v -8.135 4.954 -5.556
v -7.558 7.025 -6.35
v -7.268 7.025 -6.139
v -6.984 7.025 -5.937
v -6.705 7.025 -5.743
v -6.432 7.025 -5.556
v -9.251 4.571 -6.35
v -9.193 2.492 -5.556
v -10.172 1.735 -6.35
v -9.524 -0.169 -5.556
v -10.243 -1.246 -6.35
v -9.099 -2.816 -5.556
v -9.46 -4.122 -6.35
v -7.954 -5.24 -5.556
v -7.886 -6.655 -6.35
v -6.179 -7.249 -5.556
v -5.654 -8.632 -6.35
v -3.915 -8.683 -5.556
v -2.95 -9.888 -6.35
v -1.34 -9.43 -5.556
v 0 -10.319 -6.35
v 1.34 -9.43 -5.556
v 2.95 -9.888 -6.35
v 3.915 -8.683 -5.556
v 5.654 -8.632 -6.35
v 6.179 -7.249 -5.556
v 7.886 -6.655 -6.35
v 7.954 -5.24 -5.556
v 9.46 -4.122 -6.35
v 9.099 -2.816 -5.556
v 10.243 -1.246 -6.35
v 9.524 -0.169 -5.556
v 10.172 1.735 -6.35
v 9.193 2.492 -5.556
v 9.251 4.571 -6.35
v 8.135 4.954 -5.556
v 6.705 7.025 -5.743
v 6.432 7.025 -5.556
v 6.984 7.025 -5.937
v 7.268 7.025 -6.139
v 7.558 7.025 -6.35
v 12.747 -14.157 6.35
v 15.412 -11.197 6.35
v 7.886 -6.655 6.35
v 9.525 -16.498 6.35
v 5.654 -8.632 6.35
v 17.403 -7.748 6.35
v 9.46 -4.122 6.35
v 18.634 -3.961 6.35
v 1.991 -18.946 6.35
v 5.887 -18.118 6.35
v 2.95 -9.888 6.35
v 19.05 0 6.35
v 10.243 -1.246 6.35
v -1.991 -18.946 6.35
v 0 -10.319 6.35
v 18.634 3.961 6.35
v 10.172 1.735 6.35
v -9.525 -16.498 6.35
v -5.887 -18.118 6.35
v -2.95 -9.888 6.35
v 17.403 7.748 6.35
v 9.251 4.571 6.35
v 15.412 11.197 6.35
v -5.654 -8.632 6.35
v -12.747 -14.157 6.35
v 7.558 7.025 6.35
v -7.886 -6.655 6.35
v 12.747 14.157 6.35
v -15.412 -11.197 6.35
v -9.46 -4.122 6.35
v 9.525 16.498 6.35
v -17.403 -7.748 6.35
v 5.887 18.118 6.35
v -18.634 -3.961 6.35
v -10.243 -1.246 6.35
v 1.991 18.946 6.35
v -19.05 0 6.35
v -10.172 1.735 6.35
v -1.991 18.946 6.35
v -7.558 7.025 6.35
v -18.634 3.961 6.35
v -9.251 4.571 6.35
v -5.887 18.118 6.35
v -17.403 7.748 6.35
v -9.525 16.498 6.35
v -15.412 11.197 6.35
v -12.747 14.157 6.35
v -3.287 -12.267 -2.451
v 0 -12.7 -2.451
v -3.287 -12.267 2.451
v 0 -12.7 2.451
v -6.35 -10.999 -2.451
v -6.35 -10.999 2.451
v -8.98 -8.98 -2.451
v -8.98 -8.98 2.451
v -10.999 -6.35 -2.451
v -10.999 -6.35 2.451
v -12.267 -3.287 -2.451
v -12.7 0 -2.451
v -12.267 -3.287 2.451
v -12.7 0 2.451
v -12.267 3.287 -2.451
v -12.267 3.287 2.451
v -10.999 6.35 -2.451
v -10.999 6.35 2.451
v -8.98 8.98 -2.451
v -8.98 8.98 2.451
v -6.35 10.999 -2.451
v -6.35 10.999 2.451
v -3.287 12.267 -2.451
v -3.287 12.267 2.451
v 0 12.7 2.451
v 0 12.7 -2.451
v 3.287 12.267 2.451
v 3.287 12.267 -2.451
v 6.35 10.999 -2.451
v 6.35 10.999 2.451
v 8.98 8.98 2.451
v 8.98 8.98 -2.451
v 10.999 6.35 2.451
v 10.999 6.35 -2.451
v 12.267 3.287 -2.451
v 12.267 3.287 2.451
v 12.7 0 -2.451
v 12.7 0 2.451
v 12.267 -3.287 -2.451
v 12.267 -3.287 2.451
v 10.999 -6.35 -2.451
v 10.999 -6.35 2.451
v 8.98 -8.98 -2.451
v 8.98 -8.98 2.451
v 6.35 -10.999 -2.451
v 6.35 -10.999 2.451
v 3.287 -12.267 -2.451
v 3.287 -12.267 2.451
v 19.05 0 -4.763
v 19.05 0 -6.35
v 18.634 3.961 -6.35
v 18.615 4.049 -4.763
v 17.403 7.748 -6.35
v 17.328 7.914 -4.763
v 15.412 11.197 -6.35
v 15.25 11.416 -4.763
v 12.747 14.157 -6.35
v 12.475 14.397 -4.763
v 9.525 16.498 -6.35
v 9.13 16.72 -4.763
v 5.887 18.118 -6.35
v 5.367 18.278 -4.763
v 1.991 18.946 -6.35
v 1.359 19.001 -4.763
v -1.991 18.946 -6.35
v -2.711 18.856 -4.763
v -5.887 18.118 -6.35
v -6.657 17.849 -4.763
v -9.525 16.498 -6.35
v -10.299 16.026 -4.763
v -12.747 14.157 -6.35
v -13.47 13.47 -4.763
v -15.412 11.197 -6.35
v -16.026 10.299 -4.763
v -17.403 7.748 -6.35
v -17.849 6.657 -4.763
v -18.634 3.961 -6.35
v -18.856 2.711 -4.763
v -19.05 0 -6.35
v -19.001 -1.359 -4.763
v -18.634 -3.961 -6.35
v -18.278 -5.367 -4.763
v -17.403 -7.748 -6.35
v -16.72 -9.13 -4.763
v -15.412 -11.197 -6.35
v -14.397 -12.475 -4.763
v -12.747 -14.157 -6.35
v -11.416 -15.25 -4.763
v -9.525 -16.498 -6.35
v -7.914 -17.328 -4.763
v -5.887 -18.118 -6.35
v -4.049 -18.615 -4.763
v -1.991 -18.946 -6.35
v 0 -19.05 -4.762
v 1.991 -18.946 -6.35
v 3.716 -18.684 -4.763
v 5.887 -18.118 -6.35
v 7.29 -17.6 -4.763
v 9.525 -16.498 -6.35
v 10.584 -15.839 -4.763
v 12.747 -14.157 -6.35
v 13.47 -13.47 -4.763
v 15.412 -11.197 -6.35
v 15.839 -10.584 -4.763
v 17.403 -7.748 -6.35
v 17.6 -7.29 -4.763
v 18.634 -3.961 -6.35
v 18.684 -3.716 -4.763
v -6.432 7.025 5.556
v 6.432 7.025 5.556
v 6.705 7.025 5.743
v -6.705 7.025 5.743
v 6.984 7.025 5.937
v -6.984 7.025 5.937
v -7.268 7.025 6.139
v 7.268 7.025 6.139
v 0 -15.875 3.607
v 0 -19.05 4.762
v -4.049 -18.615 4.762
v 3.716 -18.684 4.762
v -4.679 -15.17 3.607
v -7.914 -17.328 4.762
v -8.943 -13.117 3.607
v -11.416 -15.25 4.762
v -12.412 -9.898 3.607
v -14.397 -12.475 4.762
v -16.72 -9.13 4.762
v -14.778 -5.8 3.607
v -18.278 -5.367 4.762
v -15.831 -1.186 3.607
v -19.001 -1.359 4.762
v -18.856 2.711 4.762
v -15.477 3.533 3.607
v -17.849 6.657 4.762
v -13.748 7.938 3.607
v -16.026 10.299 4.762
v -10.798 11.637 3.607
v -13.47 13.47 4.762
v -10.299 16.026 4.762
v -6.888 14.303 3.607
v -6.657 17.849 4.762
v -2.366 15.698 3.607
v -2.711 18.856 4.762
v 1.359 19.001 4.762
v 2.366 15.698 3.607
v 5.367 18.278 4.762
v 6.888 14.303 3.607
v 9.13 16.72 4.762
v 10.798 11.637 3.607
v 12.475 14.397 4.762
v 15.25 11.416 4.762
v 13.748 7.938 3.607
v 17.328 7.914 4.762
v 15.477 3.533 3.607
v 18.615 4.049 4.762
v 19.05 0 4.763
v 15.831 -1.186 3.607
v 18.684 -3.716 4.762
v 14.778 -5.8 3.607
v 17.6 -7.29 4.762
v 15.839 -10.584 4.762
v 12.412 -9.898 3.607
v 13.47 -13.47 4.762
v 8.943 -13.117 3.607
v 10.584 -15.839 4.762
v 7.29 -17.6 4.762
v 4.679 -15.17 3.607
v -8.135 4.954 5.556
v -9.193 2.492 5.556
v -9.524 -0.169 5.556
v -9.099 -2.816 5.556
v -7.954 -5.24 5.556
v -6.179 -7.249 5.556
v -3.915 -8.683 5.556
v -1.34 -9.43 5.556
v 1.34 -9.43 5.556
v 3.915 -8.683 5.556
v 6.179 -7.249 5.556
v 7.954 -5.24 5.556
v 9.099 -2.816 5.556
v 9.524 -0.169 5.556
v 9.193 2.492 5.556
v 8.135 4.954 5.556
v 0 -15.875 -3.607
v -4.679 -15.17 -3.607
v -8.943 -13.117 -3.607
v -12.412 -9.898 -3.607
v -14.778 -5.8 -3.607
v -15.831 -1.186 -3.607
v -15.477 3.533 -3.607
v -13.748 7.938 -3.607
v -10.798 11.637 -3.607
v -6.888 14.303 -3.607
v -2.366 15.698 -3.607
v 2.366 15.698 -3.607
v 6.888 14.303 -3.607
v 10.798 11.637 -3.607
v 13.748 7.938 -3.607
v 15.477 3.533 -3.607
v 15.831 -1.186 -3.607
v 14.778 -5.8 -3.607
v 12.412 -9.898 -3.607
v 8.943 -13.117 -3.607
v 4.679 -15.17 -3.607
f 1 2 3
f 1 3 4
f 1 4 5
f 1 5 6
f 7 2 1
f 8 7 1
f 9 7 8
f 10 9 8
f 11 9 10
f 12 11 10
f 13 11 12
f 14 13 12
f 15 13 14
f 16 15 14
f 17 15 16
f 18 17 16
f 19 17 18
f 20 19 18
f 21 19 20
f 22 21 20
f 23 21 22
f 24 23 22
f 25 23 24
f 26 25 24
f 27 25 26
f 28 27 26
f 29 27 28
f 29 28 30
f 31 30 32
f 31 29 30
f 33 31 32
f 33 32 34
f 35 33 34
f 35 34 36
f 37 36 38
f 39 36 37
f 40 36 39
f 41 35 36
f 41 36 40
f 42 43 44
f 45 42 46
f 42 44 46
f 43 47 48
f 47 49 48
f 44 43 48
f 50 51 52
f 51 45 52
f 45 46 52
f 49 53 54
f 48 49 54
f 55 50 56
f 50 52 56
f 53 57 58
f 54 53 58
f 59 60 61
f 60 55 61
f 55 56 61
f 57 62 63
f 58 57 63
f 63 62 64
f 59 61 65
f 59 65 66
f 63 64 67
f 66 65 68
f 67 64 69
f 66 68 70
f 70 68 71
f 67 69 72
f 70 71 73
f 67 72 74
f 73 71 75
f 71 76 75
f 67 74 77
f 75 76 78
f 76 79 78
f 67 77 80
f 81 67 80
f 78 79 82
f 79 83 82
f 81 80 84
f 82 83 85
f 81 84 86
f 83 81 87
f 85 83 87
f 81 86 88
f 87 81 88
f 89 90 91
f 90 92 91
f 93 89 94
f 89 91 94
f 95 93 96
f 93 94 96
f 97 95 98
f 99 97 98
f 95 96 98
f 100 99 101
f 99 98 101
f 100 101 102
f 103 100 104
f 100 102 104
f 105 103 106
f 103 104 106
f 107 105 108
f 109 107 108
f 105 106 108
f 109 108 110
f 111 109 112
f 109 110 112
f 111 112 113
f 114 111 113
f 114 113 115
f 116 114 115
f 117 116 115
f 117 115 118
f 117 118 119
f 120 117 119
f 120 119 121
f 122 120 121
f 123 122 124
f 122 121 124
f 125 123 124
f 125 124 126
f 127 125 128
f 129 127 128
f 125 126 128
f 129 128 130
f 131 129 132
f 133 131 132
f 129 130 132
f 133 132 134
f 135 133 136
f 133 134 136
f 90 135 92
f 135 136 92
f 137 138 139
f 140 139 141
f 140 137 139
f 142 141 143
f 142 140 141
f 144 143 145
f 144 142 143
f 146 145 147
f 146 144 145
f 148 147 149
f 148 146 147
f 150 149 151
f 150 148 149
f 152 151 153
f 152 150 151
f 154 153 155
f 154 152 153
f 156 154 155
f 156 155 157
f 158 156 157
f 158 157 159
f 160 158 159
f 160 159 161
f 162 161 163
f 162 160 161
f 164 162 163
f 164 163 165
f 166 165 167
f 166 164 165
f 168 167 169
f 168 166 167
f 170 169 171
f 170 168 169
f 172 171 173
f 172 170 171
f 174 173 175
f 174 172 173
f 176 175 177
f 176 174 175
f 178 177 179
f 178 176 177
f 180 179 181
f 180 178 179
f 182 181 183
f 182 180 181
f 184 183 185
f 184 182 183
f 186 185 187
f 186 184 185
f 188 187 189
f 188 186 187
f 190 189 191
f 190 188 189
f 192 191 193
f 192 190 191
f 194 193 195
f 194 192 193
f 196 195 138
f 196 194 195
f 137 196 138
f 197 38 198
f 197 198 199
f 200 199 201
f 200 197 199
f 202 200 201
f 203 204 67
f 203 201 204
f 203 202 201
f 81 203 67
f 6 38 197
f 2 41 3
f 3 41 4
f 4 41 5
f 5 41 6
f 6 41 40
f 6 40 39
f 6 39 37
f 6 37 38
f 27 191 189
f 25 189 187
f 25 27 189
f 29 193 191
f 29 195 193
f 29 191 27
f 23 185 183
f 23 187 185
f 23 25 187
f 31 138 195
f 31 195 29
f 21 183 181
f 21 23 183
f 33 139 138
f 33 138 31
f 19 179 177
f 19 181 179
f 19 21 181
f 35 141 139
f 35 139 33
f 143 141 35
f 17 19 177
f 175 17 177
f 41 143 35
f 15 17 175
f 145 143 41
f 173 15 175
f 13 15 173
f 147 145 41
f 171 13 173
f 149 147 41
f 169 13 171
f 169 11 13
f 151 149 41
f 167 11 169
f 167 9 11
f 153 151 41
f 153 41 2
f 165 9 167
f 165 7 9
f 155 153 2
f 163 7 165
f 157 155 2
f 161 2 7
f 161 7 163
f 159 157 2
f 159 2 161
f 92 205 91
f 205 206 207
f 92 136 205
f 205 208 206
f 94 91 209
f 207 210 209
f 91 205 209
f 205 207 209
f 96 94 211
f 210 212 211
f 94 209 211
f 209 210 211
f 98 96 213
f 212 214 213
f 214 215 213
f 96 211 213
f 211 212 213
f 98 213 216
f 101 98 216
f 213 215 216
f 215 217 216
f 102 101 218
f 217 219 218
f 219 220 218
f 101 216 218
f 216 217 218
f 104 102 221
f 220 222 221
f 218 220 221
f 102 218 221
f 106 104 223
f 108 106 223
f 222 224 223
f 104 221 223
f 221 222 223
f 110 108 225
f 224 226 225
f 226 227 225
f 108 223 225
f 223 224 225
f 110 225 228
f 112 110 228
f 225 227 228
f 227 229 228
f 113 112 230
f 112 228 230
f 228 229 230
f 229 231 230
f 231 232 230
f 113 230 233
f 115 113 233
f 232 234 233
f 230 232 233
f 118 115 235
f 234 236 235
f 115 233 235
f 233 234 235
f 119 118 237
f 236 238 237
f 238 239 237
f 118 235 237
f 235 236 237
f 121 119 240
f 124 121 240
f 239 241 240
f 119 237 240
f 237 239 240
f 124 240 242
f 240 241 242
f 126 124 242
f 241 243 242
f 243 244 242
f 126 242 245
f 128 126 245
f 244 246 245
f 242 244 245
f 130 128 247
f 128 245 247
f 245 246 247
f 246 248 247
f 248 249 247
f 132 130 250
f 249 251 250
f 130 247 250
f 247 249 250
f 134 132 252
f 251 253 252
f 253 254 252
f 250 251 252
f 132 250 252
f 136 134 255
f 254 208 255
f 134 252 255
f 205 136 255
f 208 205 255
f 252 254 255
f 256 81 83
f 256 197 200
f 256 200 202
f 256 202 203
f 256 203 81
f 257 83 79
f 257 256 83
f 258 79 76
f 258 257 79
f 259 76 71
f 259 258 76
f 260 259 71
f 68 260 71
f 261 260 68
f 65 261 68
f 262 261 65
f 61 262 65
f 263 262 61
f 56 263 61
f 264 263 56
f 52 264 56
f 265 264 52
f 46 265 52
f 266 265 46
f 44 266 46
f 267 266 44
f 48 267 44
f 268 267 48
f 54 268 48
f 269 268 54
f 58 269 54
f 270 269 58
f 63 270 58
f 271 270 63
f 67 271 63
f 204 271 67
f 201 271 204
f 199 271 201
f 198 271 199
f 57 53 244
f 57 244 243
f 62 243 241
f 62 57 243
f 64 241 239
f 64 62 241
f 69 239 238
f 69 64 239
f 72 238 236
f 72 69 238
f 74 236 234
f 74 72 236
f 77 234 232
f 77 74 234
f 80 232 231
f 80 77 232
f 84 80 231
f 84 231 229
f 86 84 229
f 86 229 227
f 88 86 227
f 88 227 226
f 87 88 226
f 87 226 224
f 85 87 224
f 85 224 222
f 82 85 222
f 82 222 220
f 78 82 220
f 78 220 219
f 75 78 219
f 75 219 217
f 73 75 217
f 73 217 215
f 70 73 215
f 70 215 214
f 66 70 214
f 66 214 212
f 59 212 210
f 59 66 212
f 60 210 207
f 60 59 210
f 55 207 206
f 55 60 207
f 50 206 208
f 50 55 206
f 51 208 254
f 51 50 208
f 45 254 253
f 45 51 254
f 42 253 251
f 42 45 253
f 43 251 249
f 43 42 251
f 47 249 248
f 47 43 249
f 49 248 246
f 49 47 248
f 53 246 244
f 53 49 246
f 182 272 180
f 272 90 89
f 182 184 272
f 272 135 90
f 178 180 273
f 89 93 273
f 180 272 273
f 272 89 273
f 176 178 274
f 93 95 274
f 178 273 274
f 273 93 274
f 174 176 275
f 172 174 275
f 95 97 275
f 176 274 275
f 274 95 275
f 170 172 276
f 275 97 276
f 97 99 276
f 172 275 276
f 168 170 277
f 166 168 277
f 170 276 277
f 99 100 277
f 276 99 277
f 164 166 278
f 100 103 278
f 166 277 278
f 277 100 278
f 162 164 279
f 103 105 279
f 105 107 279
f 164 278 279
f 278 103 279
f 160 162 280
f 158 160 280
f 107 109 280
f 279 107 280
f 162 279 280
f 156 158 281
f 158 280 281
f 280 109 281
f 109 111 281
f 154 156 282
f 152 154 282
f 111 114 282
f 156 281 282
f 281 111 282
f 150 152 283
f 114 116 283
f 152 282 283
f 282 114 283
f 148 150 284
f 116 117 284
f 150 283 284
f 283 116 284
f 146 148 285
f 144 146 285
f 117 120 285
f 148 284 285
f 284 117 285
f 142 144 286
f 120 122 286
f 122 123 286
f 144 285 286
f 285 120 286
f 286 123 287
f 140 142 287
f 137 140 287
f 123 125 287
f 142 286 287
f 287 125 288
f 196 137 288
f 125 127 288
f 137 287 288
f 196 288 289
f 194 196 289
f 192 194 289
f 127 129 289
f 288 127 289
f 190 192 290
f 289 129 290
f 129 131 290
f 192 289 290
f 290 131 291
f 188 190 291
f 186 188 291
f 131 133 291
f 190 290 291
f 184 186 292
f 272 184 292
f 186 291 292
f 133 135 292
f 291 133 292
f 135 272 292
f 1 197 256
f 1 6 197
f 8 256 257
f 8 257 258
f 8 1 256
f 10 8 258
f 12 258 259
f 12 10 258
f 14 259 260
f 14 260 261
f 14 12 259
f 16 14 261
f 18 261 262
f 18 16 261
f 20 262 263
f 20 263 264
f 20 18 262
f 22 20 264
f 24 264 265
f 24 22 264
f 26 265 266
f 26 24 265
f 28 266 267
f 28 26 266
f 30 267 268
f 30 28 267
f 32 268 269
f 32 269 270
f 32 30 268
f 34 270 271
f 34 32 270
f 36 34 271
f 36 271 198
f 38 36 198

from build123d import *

# Parameters (mm, degrees)
SKETCH1_R           = 19.05
SKETCH1_R_2         = 9.525
EXTRUDE1_DEPTH      = 6.35
CHAMFER1_SIZE       = 0.79375
BOSS_EXTRUDE1_DEPTH = 12.7


with BuildPart() as part:
    # Sketch1 → Extrude1 (new, symmetric)
    with BuildSketch(Plane.XY):
        Circle(SKETCH1_R)
        Circle(SKETCH1_R_2, mode=Mode.SUBTRACT)
    extrude(amount=EXTRUDE1_DEPTH, both=True)

    # Chamfer1
    chamfer1_edges = [part.edges().sort_by_distance(p)[0] for p in [
        (-9.525, 0, -6.35),
        (-9.525, 0, 6.35),
    ]]
    chamfer(chamfer1_edges, length=CHAMFER1_SIZE)

    # Sketch2 → Cut-Revolve1 (revolve, cut)
    with BuildSketch(Plane(origin=(0, 0, 0), x_dir=(0, 0, -1), z_dir=(1, 0, 0)), mode=Mode.PRIVATE) as cut_revolve1_sk:
        Polygon((-4.7625, 19.05), (4.7625, 19.05), (2.451289012, 12.7), (-2.451289012, 12.7), align=None)
    revolve(cut_revolve1_sk.sketch.rotate(Axis((0, 0, 6.35), (0, 0, -1)), 180), axis=Axis((0, 0, 6.35), (0, 0, -1)), mode=Mode.SUBTRACT)

    # Sketch3 → Boss-Extrude1 (add, through all)
    with BuildSketch(Plane(origin=(0, 0, -6.35), x_dir=(-1, 0, 0), z_dir=(0, 0, -1))):
        with BuildLine():
            ThreePointArc((7.558172832, 7.025), (0, 10.31875), (-7.558172832, 7.025))
            Line((-7.558172832, 7.025), (7.558172832, 7.025))
        make_face()
    extrude(amount=-BOSS_EXTRUDE1_DEPTH)


solid = part.part
